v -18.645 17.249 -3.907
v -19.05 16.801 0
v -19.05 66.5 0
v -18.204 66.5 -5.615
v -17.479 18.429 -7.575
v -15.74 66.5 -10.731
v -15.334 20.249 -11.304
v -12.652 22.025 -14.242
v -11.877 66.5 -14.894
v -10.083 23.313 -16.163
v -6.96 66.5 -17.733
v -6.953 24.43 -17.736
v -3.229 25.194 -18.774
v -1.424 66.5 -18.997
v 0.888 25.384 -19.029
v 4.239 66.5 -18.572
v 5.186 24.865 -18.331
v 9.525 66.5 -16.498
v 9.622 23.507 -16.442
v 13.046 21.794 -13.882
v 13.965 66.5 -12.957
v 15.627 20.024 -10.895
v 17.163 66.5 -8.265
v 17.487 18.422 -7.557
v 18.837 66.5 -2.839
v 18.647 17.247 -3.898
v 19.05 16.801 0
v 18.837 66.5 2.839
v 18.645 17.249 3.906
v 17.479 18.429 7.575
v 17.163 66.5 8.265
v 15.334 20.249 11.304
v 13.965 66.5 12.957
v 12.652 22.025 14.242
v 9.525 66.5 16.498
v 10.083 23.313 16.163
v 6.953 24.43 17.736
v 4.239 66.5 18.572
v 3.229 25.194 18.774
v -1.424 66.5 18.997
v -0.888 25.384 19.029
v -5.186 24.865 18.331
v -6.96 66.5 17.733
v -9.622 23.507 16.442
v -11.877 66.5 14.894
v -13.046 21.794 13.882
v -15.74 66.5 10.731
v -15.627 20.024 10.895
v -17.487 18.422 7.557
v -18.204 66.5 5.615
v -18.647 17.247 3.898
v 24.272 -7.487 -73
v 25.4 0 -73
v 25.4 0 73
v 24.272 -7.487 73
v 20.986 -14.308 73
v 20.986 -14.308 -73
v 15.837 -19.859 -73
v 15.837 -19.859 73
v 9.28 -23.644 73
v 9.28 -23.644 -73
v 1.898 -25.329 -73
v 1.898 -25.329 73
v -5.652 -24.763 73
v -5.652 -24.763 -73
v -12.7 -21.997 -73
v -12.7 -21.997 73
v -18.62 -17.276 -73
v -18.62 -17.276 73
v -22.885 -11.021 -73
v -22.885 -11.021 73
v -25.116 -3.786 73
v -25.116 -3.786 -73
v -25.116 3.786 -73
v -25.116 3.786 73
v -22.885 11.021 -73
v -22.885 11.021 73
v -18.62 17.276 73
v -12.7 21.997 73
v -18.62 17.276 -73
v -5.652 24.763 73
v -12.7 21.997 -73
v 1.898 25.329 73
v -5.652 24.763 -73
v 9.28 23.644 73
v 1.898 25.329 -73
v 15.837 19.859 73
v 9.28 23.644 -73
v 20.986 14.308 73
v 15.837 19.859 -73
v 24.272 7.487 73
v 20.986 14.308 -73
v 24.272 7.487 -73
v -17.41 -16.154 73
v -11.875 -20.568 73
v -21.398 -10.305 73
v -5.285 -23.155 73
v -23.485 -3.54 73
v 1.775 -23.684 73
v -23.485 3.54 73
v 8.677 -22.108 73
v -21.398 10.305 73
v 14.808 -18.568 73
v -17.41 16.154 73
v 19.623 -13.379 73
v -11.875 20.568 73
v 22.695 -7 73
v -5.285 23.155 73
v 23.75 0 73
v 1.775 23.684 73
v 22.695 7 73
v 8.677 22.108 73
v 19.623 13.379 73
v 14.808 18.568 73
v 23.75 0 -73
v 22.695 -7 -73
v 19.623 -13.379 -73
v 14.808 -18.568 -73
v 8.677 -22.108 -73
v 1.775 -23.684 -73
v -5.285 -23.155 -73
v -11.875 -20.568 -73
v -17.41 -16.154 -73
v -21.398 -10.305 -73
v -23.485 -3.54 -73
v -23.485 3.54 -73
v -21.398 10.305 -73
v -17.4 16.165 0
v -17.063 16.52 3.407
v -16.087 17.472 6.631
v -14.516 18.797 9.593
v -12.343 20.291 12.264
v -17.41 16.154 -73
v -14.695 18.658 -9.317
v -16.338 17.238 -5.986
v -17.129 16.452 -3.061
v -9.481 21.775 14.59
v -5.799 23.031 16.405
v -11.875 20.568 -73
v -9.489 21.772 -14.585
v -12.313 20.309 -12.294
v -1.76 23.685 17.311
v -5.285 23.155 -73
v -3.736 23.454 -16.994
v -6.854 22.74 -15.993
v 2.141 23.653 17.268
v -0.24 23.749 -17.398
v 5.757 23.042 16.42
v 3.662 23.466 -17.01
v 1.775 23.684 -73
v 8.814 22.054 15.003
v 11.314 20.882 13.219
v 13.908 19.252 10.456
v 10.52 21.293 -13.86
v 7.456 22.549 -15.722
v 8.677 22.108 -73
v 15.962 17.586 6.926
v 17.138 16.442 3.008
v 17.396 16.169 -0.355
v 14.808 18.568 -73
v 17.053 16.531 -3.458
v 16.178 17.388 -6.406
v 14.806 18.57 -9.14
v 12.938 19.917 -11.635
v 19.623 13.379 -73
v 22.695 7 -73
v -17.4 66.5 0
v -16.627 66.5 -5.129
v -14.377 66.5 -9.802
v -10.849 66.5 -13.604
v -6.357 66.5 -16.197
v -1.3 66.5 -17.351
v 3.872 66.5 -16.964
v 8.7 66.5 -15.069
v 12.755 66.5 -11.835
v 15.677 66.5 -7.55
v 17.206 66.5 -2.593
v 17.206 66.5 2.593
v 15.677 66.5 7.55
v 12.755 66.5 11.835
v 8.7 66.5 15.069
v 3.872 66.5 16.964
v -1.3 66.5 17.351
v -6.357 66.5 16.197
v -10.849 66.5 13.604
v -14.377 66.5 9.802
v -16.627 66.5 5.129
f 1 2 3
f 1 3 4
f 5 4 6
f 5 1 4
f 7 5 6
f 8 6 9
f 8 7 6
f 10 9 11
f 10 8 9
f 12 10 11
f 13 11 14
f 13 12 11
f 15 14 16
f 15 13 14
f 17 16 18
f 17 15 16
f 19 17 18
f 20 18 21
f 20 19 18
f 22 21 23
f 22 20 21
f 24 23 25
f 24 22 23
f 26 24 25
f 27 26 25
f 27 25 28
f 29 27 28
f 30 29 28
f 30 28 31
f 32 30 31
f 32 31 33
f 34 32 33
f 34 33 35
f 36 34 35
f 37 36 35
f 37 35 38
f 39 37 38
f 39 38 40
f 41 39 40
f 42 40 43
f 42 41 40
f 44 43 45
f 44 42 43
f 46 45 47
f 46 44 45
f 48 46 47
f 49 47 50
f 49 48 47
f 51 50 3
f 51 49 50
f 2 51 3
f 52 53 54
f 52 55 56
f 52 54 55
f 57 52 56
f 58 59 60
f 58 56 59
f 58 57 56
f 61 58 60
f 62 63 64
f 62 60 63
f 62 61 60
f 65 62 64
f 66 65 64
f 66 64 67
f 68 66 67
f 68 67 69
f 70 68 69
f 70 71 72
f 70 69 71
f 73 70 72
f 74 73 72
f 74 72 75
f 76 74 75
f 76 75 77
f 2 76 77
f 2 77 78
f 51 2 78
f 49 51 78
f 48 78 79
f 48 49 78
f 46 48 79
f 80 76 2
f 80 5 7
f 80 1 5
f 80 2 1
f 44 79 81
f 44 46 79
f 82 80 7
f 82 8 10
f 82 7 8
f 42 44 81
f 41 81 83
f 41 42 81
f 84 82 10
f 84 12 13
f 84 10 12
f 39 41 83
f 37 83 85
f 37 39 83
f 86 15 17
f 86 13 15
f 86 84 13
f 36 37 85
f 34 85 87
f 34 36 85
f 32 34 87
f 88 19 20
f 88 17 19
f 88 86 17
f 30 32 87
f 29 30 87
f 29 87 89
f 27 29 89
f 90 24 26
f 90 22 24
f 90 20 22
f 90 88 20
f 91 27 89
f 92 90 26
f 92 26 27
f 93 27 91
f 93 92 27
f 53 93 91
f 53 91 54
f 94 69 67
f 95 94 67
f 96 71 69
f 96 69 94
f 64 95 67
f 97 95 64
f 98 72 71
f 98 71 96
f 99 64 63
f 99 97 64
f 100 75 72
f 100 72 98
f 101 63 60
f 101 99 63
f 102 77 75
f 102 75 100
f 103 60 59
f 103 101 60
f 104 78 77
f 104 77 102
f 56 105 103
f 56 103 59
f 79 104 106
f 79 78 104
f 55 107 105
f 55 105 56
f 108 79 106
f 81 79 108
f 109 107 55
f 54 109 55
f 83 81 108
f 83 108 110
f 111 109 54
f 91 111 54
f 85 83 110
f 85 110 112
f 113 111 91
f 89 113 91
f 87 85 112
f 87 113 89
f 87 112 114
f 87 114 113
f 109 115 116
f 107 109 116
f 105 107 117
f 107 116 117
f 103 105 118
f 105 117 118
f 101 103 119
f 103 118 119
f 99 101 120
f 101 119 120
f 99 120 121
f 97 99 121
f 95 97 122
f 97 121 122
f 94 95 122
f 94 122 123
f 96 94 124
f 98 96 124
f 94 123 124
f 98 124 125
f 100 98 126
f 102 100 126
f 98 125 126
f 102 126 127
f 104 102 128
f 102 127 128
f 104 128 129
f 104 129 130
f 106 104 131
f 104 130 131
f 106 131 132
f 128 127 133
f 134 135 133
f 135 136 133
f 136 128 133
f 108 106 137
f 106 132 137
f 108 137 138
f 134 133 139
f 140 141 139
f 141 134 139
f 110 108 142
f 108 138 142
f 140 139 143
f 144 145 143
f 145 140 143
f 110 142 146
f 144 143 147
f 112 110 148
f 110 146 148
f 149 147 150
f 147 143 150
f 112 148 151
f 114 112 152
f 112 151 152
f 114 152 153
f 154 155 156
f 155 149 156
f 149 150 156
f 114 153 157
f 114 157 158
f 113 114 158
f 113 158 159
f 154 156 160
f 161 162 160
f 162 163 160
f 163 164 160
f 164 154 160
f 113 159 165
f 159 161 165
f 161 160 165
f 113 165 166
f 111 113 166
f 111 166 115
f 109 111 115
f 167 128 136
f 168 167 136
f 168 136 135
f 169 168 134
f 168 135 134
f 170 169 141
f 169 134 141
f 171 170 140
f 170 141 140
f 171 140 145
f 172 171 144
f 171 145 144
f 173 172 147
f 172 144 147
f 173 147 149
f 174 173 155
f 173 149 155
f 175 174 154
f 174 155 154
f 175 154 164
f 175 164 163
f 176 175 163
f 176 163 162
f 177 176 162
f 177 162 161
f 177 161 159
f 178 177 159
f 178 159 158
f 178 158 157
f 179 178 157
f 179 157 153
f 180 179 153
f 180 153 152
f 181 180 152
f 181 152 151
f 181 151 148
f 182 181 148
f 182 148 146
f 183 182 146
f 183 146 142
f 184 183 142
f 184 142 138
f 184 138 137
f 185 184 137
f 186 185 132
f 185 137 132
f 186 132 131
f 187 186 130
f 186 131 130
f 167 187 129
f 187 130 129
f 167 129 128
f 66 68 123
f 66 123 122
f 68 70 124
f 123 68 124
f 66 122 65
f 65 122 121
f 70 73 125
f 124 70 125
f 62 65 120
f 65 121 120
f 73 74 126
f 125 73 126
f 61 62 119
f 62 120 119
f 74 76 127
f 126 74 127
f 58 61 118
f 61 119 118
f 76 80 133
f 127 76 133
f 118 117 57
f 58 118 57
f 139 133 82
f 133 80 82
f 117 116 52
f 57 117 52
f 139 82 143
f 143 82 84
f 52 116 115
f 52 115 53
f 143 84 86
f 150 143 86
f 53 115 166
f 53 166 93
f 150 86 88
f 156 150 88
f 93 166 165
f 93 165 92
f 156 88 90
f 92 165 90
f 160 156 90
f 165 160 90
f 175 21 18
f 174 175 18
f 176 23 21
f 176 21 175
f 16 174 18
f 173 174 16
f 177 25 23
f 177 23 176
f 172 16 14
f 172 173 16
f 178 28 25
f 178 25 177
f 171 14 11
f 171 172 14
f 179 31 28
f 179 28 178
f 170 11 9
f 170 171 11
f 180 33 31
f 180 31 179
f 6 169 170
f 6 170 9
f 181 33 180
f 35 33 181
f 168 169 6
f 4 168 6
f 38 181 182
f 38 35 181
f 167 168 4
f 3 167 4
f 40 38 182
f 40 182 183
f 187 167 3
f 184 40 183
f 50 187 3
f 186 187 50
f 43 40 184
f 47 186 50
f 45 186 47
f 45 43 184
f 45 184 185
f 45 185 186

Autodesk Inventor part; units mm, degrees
ref_plane "YZ Plane" through (0, 0, 0) normal (1, 0, 0) x (0, 1, 0)
ref_plane "XZ Plane" through (0, 0, 0) normal (0, 1, 0) x (-1, 0, 0)
ref_plane "XY Plane" through (0, 0, 0) normal (0, 0, 1) x (1, 0, 0)
sketch "Sketch1" plane through (0, 0, 0) normal (0, 0, 1) x (1, 0, 0)
  circle A0 centre (0, 0) radius 25.4
  dimension "d0" = 50.8
extrude "Extrusion1" add sketch "Sketch1" along normal mid plane 146
sketch "Sketch2" plane through (0, 0, 0) normal (0, 1, 0) x (-1, 0, 0)
  circle A0 centre (0, 0) radius 19.05
  dimension "d3" = 38.1
extrude "Extrusion2" add sketch "Sketch2" along normal blind 66.5
shell "Shell1" thickness 1.65 removed faces 3 at (5.6226, 66.5, 0.0883) at (-7.2508, -1.9085, 73) at (-7.2508, -1.9085, -73)
properties part number "ASME BPE - RED TEE-50.8-38.1" material "Stainless Steel, 316L"
